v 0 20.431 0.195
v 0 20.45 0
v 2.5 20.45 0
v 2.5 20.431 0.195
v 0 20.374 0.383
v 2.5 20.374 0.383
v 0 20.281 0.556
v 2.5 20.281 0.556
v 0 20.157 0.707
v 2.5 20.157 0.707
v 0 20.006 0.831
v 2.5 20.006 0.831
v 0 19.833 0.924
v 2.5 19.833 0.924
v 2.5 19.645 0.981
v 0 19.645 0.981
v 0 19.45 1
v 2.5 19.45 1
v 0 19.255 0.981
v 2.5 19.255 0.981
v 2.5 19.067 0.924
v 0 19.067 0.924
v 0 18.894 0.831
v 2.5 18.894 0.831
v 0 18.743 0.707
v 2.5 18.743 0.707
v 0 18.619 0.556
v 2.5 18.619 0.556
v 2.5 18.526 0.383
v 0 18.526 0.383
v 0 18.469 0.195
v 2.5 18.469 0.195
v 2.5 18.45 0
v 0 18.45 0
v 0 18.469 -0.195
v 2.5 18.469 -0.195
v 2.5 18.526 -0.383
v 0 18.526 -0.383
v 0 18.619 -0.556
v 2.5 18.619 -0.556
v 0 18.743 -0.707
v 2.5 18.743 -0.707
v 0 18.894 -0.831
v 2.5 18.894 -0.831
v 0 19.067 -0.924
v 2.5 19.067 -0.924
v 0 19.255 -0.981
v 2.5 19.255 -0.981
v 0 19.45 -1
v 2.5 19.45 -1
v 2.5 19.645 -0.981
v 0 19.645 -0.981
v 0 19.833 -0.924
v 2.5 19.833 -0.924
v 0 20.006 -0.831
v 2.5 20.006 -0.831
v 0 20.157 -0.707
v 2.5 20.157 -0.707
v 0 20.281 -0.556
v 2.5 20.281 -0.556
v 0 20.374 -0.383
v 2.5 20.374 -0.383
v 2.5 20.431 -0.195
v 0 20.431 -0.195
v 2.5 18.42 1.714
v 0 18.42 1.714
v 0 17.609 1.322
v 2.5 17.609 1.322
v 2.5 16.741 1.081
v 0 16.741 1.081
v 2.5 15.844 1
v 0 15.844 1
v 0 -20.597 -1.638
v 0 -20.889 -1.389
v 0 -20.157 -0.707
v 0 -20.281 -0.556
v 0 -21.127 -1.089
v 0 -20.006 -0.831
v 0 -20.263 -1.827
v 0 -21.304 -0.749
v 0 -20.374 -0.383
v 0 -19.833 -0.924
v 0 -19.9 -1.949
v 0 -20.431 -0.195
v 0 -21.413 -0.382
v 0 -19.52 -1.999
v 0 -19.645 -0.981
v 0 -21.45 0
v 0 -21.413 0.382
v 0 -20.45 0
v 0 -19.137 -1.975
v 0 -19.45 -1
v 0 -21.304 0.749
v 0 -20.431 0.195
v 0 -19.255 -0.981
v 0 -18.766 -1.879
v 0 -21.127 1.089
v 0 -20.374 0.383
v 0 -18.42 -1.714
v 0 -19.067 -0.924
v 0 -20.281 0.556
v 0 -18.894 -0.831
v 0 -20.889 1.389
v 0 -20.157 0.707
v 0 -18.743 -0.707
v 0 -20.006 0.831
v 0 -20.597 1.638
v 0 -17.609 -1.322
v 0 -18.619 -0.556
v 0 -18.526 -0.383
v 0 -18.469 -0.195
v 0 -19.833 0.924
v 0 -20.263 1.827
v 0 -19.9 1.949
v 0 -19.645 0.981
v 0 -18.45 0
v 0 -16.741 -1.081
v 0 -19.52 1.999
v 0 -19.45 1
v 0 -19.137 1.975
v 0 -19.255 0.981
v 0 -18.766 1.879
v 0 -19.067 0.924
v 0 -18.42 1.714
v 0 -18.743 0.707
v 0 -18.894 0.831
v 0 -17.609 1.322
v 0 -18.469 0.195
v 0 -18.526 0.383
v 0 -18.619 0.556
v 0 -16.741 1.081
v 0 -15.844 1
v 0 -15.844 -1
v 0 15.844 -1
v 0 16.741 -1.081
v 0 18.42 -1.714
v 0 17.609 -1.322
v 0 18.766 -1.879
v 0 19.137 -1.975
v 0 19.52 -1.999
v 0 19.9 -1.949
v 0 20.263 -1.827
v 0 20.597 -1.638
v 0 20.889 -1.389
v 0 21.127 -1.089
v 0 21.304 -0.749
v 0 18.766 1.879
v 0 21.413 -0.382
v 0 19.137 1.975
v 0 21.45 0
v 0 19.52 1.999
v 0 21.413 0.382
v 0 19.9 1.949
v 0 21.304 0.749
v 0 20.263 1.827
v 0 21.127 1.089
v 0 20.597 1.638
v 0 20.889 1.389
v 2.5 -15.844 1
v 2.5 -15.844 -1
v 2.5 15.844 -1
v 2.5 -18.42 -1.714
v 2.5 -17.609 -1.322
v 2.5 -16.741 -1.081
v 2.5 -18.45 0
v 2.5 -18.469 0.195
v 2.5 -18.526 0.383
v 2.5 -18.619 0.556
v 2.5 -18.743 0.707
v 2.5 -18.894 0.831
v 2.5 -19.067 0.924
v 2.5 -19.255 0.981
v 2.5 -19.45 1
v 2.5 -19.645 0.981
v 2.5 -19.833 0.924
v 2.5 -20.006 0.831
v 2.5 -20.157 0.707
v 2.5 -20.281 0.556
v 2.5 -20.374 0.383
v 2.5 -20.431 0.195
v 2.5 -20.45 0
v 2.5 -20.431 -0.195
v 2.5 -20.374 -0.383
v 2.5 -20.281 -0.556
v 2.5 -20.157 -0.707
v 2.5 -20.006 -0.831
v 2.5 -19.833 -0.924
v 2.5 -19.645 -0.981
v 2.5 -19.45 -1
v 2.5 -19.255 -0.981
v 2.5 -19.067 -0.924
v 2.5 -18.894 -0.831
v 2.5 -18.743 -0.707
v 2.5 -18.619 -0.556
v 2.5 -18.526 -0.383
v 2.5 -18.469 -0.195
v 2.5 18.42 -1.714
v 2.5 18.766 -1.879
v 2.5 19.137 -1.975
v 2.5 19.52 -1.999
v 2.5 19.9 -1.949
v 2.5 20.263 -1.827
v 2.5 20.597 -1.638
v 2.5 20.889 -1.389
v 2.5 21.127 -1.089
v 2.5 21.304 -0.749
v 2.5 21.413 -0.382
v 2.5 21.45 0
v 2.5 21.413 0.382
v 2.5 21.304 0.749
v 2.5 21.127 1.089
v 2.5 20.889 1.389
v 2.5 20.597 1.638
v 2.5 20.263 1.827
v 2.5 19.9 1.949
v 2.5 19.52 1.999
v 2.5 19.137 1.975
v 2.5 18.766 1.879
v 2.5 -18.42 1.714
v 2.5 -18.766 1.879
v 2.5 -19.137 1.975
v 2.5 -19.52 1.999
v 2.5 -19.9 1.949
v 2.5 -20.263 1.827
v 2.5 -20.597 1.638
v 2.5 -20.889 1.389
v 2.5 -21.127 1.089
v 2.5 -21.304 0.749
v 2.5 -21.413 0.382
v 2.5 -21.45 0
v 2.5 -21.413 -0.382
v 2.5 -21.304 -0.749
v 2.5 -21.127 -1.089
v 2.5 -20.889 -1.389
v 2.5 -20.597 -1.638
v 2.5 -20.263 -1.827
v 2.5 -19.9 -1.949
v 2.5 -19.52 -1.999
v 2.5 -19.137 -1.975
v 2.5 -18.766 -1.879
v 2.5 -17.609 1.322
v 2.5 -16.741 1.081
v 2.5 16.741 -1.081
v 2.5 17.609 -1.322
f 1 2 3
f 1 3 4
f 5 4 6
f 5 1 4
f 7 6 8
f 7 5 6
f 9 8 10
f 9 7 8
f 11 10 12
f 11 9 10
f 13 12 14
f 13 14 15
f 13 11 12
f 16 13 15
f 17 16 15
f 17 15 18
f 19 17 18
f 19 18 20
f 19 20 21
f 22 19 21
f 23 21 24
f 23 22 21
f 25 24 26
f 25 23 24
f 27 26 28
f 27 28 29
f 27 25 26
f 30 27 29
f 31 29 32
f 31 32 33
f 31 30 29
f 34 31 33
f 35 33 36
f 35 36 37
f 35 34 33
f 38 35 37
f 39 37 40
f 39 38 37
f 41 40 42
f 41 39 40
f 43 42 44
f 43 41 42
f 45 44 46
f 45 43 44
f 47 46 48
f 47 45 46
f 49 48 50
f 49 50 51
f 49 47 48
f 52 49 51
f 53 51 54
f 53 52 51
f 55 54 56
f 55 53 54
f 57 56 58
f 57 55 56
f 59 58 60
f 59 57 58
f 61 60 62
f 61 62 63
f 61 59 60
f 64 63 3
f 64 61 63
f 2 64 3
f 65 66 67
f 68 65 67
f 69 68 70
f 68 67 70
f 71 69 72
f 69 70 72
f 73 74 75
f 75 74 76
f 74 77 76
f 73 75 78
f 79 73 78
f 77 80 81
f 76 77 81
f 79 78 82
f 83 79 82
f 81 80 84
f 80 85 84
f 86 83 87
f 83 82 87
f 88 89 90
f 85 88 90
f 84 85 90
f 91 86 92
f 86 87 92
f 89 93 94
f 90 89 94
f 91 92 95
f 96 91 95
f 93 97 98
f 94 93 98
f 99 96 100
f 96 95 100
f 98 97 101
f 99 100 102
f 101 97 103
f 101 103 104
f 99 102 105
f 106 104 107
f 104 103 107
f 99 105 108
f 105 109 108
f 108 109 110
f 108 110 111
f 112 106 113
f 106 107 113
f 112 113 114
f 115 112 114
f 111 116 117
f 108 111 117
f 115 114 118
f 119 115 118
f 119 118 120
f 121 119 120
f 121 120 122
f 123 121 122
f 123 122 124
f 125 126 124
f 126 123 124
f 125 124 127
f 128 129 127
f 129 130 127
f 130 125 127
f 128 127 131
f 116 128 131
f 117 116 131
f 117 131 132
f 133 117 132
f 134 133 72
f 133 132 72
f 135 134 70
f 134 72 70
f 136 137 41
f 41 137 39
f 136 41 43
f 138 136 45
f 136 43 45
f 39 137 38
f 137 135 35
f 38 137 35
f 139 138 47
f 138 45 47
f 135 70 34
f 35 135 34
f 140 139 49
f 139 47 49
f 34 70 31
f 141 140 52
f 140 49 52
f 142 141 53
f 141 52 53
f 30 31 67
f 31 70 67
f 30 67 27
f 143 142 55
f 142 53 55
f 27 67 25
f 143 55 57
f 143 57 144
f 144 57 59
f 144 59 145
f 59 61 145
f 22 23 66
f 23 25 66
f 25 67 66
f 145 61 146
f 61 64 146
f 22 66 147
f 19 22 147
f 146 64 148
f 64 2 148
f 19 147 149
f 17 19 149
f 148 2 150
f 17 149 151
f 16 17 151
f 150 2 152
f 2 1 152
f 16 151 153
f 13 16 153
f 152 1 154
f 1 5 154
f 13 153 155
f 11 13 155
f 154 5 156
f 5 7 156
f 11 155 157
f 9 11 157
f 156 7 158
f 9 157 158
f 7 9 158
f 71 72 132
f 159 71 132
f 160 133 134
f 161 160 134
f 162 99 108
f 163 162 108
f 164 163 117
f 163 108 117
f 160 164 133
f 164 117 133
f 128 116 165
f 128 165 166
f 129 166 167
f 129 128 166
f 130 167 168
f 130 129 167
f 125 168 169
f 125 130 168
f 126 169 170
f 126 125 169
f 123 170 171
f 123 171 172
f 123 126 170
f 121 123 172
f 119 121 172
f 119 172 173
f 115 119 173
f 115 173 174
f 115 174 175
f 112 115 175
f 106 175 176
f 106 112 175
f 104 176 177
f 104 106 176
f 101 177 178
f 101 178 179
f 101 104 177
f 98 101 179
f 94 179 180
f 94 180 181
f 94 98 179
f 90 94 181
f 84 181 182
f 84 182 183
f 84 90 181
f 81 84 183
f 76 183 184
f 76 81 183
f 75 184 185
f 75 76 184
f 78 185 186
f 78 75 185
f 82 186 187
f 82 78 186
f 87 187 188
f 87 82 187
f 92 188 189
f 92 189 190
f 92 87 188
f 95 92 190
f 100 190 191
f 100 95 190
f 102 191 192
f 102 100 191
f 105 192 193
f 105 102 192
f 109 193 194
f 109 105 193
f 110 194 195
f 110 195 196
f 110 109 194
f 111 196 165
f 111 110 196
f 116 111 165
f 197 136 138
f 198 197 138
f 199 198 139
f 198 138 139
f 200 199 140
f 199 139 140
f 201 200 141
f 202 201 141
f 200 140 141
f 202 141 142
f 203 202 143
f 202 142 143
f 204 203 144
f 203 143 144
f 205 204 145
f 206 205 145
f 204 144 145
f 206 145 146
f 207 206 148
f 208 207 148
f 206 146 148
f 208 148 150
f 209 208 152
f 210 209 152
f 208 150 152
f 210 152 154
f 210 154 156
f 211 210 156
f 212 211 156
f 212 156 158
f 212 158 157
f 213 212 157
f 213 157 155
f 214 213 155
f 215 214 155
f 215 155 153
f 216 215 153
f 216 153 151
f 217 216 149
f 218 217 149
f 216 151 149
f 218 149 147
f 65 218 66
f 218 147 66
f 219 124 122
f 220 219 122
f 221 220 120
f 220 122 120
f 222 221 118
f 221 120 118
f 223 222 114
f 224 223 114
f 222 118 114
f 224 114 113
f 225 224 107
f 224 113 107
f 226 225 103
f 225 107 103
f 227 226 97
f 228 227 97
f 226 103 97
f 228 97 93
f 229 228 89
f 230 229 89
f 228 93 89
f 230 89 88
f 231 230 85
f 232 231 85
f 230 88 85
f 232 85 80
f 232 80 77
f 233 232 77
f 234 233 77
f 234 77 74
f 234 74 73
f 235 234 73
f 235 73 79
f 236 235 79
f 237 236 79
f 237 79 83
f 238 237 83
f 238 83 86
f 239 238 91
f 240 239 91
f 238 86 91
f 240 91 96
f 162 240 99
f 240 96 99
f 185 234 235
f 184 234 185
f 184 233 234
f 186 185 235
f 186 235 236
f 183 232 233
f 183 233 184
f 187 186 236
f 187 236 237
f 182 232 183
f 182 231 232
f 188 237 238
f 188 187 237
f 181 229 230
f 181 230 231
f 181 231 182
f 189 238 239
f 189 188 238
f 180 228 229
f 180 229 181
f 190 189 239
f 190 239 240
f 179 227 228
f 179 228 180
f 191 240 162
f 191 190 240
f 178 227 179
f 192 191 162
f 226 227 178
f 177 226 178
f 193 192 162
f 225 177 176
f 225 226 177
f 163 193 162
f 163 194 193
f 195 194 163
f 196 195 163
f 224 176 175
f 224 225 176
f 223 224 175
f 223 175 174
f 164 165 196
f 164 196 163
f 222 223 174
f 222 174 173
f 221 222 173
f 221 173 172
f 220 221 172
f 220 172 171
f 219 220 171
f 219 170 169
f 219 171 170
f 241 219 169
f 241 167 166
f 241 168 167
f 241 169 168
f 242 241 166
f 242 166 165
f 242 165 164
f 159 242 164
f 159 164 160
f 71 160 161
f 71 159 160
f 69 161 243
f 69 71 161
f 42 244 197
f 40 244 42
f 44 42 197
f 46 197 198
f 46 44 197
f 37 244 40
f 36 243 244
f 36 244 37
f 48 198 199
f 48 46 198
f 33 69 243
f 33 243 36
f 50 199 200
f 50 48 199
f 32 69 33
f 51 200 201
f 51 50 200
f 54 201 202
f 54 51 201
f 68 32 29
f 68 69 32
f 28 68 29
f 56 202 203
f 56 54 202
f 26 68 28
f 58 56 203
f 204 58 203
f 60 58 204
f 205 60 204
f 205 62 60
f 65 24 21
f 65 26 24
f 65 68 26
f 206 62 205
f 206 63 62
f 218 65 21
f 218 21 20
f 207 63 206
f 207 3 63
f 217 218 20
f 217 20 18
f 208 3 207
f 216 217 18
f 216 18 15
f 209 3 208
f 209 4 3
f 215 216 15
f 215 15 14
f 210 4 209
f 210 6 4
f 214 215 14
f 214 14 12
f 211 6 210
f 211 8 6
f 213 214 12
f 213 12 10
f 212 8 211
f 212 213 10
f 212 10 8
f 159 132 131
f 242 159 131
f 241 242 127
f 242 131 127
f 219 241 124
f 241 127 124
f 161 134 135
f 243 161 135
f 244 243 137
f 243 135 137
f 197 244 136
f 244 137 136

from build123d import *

# Parameters (mm, degrees)
F0_R     = 1
F1_DEPTH = 2.5


with BuildPart() as f1:
    # F0 (on Right) → F1 (new body)
    with BuildSketch(Plane.YZ):
        with BuildLine():
            Line((-15.844449, -1), (15.844449, -1))
            ThreePointArc((15.844449, -1), (17.180755, -1.181879), (18.419842, -1.714286))
            ThreePointArc((18.419842, -1.714286), (21.45, 0), (18.419842, 1.714286))
            ThreePointArc((18.419842, 1.714286), (17.180755, 1.181879), (15.844449, 1))
            Line((15.844449, 1), (-15.844449, 1))
            ThreePointArc((-15.844449, 1), (-17.180755, 1.181879), (-18.419842, 1.714286))
            ThreePointArc((-18.419842, 1.714286), (-21.45, 0), (-18.419842, -1.714286))
            ThreePointArc((-18.419842, -1.714286), (-17.180755, -1.181879), (-15.844449, -1))
        make_face()
        with Locations((-19.45, 0)):
            Circle(F0_R, mode=Mode.SUBTRACT)
        with Locations((19.45, 0)):
            Circle(F0_R, mode=Mode.SUBTRACT)
    extrude(amount=F1_DEPTH)


solid = f1.part
